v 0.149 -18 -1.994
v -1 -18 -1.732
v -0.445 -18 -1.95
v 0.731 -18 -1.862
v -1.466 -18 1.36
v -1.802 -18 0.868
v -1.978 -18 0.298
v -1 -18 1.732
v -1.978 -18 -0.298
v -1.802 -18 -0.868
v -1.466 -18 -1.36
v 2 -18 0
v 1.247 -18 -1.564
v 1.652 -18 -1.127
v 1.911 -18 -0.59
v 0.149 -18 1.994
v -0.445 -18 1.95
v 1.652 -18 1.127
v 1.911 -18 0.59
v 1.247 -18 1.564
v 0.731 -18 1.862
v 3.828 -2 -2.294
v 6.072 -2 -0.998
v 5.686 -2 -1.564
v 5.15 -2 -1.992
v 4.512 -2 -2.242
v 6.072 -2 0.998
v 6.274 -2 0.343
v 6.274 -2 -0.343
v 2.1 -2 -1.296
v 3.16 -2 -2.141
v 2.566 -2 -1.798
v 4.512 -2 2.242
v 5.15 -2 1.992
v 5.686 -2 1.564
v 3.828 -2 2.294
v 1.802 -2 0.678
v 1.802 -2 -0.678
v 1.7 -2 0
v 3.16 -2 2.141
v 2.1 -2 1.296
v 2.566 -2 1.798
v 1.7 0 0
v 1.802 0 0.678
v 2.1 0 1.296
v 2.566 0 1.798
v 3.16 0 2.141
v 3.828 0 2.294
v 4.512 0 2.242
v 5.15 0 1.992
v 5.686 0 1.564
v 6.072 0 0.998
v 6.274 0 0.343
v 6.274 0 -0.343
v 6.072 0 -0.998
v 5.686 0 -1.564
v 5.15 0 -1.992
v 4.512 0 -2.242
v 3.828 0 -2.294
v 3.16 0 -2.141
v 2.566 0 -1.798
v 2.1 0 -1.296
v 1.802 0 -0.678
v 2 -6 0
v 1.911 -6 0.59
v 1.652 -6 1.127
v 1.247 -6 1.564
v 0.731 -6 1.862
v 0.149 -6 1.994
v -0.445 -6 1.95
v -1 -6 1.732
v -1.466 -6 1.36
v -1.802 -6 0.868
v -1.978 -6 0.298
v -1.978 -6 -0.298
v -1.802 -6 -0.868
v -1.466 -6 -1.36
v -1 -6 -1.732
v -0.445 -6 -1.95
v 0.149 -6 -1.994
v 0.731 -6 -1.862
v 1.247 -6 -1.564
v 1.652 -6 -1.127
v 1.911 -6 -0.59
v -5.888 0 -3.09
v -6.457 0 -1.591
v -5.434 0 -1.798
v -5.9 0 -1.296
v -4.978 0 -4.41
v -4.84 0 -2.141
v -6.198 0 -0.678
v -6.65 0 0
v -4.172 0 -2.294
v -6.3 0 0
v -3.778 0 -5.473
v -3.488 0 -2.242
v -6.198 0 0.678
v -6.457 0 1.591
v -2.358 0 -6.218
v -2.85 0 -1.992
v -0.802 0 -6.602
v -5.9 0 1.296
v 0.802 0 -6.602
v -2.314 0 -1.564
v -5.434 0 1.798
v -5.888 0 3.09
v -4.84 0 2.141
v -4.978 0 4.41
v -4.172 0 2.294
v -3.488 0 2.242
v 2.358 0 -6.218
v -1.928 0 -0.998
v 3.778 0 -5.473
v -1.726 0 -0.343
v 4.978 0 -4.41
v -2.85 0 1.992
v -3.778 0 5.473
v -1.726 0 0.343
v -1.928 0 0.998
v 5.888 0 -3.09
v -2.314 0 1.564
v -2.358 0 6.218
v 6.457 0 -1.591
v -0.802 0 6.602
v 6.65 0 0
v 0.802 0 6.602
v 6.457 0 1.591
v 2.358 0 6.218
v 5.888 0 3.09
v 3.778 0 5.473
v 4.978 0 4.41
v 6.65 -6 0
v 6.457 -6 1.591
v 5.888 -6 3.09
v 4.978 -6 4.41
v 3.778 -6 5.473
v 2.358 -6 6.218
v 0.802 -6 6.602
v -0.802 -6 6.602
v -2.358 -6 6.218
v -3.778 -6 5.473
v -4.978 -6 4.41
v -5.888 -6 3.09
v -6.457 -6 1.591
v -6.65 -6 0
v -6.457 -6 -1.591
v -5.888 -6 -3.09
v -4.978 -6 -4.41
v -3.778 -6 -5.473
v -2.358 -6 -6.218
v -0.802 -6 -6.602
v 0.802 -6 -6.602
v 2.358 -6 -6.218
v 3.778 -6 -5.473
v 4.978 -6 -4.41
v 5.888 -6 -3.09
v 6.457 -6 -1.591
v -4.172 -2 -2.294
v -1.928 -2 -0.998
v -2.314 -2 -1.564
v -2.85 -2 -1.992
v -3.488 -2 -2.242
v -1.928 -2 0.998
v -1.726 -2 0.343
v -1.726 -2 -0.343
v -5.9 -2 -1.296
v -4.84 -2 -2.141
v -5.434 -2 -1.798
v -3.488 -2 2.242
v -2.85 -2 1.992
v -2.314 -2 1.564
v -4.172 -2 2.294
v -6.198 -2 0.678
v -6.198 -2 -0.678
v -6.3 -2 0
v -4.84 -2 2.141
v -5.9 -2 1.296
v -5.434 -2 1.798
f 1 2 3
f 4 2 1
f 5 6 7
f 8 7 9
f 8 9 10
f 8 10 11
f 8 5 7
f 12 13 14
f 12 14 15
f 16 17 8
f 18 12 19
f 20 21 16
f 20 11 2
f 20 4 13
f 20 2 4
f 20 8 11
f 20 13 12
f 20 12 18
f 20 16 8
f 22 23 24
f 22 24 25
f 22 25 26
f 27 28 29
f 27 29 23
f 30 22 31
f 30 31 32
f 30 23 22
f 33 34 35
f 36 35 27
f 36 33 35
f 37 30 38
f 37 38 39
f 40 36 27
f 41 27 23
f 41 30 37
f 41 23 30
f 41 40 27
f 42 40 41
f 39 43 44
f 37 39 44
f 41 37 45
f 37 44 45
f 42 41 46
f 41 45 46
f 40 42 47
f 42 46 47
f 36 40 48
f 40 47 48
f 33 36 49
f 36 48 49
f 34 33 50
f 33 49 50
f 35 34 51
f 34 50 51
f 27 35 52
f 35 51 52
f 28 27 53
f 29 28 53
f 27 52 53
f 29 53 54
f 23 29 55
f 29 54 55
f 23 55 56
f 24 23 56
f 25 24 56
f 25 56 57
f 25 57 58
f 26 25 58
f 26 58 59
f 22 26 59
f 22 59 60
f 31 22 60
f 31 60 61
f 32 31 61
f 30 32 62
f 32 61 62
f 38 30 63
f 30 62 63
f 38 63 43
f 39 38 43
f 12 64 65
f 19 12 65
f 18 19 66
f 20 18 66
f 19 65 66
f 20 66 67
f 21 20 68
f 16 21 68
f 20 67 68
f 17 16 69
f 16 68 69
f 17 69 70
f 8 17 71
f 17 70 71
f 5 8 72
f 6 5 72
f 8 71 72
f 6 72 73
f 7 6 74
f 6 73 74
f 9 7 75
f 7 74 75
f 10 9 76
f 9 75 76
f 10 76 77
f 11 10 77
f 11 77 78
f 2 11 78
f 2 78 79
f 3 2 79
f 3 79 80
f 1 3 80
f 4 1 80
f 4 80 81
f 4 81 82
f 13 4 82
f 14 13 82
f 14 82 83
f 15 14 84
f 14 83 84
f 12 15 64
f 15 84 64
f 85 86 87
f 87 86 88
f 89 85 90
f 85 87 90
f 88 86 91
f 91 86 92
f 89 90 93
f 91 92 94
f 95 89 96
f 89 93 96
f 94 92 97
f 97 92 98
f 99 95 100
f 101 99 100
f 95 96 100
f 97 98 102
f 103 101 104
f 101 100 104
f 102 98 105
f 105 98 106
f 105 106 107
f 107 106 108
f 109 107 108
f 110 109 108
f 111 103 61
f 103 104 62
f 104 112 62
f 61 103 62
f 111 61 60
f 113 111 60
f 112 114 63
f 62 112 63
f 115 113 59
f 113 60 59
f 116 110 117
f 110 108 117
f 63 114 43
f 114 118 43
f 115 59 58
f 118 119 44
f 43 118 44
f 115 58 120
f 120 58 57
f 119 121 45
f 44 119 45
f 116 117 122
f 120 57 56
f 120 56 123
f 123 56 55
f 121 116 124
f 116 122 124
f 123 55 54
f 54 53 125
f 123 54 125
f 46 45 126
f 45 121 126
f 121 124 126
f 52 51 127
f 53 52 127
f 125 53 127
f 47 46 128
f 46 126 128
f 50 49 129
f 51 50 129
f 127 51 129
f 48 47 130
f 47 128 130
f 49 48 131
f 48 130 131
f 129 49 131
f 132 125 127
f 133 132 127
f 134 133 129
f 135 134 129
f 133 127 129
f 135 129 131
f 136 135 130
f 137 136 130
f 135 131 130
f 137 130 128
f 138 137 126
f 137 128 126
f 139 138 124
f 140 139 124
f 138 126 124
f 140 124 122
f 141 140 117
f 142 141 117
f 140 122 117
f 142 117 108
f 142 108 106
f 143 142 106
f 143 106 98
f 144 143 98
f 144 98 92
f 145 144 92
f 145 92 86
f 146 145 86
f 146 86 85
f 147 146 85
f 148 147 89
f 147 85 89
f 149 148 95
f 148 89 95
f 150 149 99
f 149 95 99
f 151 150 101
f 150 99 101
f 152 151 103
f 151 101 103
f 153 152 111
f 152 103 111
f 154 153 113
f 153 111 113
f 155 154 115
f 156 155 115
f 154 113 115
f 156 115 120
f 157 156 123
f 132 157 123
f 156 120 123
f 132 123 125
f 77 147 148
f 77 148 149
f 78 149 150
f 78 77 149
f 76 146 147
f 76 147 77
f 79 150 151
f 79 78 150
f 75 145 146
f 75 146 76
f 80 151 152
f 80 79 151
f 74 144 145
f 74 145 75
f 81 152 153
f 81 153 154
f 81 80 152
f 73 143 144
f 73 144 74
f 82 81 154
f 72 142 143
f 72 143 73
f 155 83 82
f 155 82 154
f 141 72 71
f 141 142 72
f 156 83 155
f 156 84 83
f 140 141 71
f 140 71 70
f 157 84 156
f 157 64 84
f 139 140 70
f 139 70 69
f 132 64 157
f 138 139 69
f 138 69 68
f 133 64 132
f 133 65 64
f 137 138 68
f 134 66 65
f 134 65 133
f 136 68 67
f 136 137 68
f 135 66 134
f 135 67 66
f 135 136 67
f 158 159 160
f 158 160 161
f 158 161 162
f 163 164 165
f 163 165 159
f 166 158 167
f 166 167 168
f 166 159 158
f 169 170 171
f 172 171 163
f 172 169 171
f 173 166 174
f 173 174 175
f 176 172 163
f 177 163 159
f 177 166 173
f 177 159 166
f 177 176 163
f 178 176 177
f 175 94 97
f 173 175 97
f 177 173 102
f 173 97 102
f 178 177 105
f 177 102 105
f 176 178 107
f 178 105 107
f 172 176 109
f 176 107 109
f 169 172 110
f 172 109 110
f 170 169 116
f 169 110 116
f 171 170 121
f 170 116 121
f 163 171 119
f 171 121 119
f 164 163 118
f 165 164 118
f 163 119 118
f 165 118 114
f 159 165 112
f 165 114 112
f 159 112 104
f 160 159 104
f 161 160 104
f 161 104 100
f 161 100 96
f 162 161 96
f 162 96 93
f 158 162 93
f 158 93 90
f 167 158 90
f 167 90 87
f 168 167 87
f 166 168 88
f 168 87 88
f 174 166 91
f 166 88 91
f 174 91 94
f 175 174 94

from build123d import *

# Parameters (mm, degrees)
F0_R     = 6.65
F1_DEPTH = 6
F2_R     = 2
F3_DEPTH = 12
F4_R     = 2.3
F5_DEPTH = 2


with BuildPart() as f1:
    # F0 (on Front) → F1 (new body)
    with BuildSketch(Plane.XZ):
        Circle(F0_R)
    extrude(amount=F1_DEPTH)

    # F2 (on face) → F3 (join)
    with BuildSketch(Plane.XZ.offset(6)):
        Circle(F2_R)
    extrude(amount=F3_DEPTH)

    # F4 (on face) → F5 (cut)
    with BuildSketch(Plane(origin=(0, 0, 0), x_dir=(-1, 0, 0), z_dir=(0, 1, 0))):
        with Locations((-4, 0)):
            Circle(F4_R)
        with Locations((4, 0)):
            Circle(F4_R)
    extrude(amount=-F5_DEPTH, mode=Mode.SUBTRACT)


solid = f1.part
